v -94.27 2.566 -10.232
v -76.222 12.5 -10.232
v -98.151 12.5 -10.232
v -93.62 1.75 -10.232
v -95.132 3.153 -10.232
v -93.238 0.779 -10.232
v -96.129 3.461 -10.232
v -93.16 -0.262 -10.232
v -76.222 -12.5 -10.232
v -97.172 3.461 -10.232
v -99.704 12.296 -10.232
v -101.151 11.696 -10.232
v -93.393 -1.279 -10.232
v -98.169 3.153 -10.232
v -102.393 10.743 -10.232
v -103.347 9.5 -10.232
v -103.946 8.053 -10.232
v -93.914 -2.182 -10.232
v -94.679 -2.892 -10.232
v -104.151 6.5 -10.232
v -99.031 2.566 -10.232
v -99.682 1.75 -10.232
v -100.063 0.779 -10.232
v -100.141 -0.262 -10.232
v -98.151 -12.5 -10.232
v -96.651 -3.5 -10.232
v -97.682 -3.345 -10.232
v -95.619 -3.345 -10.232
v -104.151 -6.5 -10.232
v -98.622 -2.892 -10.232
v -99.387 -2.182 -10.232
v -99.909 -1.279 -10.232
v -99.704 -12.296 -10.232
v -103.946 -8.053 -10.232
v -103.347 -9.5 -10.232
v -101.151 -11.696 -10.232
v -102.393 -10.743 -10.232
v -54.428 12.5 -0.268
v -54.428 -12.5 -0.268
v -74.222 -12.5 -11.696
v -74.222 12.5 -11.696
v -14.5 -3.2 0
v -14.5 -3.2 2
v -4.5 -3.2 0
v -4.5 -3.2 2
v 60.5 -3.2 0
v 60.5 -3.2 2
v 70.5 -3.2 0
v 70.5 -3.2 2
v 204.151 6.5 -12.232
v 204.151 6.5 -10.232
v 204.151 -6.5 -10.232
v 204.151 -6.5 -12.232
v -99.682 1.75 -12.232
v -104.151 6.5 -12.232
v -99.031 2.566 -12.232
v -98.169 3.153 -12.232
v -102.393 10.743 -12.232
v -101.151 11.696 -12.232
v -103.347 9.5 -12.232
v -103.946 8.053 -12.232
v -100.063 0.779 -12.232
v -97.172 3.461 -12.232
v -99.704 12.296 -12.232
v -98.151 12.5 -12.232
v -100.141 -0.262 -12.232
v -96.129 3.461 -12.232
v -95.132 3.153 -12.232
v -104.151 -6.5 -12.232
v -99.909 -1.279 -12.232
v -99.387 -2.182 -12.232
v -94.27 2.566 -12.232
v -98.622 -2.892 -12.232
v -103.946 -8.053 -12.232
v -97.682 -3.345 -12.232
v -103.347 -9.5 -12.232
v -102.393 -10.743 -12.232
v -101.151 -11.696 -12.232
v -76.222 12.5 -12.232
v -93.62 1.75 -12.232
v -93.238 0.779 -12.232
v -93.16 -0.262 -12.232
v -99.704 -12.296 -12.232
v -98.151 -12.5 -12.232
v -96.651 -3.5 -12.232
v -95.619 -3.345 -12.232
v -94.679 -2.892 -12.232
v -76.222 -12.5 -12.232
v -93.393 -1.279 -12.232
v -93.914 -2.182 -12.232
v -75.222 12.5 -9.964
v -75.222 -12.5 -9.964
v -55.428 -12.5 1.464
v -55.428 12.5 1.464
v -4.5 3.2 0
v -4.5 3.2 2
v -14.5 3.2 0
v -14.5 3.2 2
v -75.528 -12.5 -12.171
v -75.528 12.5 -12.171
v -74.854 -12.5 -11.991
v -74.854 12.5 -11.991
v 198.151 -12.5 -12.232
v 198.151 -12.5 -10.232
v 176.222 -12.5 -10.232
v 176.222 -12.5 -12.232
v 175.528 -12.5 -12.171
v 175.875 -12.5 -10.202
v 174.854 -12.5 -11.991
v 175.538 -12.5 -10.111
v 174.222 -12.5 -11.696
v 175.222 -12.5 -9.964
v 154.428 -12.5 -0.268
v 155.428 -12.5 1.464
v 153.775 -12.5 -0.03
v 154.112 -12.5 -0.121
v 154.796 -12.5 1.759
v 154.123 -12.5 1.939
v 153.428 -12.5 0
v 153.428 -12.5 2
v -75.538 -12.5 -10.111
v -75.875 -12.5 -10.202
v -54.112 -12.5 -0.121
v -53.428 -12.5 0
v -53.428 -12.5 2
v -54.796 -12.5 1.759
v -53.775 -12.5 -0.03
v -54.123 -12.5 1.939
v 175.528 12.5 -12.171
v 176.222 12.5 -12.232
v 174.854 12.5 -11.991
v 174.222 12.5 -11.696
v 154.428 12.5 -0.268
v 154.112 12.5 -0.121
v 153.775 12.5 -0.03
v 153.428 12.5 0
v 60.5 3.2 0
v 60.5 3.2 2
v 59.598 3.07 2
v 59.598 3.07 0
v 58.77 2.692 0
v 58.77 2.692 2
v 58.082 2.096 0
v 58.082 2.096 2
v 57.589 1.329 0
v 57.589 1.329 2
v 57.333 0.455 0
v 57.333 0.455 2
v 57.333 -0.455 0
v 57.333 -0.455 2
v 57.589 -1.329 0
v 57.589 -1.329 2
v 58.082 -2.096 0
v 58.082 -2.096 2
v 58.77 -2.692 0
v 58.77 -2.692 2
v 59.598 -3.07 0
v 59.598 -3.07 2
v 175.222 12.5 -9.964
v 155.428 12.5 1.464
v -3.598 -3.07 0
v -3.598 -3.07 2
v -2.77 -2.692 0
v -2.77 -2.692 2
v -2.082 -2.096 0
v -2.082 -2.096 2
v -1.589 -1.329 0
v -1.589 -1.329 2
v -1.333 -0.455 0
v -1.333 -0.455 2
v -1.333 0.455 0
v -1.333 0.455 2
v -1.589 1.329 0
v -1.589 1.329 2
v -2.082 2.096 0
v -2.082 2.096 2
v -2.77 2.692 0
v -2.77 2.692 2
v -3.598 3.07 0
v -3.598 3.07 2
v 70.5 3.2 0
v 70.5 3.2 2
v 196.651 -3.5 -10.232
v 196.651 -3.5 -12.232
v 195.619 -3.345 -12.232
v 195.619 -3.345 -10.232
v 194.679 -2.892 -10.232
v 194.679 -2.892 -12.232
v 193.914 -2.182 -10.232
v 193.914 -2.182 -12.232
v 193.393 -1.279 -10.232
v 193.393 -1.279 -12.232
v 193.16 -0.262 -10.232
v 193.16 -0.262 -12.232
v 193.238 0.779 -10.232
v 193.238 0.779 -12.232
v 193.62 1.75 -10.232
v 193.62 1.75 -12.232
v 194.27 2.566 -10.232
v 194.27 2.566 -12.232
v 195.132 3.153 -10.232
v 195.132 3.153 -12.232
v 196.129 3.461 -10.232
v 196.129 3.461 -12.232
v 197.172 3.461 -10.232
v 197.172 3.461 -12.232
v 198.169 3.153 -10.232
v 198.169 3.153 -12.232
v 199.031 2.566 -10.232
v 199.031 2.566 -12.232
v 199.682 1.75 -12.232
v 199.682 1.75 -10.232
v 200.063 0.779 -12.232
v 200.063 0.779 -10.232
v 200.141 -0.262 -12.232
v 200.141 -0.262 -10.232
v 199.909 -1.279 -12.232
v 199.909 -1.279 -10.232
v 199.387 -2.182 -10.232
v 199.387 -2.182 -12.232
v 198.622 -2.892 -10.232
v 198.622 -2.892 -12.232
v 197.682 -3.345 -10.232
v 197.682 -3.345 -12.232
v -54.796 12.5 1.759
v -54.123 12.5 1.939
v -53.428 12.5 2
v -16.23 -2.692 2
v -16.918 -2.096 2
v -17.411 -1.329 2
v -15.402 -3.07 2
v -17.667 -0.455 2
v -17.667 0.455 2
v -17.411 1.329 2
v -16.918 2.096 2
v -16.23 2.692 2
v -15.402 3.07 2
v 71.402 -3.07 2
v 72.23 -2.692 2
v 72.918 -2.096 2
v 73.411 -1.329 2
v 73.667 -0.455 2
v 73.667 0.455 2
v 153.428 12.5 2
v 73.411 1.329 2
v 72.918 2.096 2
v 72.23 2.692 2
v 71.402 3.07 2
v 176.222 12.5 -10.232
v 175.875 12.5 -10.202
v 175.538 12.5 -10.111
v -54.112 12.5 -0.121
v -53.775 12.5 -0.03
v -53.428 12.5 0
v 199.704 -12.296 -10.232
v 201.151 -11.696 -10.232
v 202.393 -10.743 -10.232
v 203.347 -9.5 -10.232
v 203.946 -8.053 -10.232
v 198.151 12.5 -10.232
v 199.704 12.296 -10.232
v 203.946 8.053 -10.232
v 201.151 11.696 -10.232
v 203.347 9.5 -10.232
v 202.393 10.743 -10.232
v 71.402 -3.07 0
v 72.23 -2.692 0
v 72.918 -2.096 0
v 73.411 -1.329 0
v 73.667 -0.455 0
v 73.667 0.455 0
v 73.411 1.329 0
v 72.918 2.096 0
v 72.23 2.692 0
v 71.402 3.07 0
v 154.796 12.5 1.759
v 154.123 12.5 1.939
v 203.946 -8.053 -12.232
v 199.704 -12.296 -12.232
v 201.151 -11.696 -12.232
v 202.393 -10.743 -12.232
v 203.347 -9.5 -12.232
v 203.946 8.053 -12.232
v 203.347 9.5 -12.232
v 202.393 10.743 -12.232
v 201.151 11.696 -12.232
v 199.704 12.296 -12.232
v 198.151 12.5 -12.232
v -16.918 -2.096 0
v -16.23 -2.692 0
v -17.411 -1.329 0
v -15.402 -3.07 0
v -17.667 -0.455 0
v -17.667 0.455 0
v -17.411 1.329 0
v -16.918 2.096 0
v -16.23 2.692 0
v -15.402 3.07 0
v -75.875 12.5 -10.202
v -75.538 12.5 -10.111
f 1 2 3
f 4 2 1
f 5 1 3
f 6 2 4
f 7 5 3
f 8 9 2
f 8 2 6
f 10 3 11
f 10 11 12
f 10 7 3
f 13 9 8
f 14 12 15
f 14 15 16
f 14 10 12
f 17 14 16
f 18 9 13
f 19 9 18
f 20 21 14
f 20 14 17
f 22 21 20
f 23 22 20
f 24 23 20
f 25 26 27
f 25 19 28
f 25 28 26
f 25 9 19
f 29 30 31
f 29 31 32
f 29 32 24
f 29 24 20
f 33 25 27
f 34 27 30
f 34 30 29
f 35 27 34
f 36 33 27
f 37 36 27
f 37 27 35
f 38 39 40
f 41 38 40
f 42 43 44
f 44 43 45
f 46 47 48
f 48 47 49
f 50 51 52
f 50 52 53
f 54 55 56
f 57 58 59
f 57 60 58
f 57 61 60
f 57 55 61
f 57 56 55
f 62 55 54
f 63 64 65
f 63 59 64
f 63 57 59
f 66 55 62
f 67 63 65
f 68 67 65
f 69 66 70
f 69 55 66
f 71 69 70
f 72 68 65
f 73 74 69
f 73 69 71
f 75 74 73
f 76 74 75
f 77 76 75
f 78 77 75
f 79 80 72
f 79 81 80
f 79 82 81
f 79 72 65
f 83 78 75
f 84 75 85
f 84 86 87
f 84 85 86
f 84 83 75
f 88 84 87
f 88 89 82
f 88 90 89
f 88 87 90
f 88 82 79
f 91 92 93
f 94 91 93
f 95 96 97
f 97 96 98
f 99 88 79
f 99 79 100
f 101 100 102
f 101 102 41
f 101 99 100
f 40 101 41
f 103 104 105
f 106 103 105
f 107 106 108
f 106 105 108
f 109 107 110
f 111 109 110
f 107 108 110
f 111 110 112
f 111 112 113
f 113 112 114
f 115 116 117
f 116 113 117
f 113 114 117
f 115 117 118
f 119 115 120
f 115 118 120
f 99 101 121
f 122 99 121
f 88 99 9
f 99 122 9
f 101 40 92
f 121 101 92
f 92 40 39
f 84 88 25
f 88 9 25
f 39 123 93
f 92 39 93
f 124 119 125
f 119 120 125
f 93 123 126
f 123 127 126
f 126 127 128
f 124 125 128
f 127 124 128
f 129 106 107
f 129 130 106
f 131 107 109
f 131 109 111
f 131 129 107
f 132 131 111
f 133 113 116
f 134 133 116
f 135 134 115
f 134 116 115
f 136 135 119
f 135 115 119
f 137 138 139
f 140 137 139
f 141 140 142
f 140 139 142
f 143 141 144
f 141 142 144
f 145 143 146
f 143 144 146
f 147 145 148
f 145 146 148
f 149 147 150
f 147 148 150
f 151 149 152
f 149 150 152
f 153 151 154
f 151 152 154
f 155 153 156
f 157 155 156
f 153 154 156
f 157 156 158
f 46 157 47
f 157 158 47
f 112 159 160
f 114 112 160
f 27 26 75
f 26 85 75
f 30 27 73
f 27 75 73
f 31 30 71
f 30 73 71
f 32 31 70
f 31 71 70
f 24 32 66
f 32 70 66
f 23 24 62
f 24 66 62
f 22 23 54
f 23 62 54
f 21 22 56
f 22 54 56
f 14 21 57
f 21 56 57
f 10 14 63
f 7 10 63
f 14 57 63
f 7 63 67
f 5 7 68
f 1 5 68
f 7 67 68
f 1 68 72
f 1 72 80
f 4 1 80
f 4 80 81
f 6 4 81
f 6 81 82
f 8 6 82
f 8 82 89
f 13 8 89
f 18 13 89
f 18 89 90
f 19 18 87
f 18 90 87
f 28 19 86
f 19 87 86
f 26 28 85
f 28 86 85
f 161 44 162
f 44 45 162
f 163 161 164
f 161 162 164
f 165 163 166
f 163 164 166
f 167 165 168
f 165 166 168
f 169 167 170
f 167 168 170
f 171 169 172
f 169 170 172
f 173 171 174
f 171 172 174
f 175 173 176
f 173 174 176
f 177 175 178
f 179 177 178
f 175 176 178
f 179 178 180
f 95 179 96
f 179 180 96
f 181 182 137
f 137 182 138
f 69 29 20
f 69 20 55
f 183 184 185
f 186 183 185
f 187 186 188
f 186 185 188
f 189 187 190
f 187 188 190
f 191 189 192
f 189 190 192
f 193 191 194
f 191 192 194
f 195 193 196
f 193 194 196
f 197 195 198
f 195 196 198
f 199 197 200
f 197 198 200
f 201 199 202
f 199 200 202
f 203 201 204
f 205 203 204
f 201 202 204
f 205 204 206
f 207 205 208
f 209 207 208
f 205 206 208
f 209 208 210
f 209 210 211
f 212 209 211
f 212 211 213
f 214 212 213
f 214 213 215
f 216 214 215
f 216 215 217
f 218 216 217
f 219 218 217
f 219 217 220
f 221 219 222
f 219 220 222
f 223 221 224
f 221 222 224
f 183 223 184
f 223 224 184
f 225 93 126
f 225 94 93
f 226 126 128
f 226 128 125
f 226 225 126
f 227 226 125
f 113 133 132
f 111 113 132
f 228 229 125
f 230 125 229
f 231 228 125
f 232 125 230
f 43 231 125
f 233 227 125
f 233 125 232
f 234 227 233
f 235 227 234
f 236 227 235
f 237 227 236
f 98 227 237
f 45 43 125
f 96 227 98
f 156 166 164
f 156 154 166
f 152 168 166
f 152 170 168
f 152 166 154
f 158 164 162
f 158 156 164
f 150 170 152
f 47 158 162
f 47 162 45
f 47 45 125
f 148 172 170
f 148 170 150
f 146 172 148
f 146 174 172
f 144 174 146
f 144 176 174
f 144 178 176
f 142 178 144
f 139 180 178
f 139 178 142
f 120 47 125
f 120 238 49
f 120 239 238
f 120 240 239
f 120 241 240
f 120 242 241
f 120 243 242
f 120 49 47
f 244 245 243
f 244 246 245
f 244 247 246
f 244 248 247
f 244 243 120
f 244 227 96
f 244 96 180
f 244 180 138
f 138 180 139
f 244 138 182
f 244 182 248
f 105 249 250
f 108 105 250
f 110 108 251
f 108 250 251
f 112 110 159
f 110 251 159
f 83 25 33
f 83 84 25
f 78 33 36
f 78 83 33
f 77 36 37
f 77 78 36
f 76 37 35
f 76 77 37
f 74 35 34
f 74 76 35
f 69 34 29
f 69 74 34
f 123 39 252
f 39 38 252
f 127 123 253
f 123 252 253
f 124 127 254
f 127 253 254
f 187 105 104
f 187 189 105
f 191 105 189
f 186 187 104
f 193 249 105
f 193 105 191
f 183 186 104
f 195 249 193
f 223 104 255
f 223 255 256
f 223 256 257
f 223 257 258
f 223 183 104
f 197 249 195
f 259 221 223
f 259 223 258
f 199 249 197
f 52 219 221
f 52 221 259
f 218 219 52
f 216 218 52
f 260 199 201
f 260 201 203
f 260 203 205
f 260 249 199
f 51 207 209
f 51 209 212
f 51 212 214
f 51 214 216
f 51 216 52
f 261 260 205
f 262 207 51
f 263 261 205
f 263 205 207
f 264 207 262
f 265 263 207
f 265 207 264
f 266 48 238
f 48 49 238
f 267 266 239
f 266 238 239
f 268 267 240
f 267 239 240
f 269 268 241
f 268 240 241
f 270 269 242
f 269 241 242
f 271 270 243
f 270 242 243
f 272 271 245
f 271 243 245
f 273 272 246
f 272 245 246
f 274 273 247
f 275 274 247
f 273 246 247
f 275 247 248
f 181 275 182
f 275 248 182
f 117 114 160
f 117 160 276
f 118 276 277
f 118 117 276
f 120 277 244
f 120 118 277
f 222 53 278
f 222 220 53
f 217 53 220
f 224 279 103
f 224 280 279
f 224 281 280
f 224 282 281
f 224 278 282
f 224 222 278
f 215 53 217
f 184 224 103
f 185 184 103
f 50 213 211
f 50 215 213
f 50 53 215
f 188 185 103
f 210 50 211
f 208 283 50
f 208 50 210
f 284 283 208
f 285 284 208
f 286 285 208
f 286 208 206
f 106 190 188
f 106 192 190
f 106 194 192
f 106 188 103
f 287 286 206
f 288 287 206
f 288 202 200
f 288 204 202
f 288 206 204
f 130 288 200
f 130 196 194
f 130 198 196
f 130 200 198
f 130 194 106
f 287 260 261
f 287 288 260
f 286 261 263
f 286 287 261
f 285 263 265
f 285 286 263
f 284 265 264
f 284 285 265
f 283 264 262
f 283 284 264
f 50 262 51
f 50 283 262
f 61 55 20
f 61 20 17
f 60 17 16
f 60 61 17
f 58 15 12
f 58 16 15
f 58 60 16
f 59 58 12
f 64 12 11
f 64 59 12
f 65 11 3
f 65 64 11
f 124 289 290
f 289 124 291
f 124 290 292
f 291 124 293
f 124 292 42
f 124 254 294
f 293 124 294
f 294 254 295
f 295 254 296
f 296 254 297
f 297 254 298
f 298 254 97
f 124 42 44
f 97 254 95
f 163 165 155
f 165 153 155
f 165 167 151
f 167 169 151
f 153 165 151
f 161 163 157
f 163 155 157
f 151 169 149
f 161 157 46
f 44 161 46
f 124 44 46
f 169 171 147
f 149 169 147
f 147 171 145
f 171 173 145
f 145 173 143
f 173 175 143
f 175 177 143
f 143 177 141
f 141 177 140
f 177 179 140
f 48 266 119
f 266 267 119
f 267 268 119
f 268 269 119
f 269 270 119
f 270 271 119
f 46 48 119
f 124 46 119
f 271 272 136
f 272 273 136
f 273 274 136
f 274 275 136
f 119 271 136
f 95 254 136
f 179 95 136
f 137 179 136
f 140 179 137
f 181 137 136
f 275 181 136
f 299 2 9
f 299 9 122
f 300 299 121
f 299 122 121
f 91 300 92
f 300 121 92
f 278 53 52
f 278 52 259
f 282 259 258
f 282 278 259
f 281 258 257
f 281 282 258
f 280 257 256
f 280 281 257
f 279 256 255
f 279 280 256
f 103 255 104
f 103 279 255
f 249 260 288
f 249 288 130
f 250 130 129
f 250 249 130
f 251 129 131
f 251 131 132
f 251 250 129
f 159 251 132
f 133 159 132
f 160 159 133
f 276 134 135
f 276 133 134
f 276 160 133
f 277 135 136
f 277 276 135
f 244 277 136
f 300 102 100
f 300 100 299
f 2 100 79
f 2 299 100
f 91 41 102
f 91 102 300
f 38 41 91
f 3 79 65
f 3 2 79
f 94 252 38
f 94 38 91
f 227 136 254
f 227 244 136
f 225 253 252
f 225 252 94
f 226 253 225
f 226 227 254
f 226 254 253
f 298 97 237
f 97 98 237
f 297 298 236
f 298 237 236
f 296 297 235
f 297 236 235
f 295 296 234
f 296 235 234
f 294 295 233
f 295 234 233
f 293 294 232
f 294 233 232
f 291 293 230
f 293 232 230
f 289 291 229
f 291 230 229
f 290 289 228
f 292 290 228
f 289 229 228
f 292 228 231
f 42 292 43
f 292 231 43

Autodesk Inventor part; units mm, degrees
ref_plane "YZ Plane" through (0, 0, 0) normal (1, 0, 0) x (0, 1, 0)
ref_plane "XZ Plane" through (0, 0, 0) normal (0, 1, 0) x (-1, 0, 0)
ref_plane "XY Plane" through (0, 0, 0) normal (0, 0, 1) x (1, 0, 0)
sketch "Sketch1" plane through (0, 0, 0) normal (0, 0, 1) x (1, 0, 0)
  line L0 (-54.5, -12.5) -> (154.5, -12.5)
  line L1 (154.5, -12.5) -> (154.5, 12.5)
  line L2 (154.5, 12.5) -> (-54.5, 12.5)
  line L3 (-54.5, 12.5) -> (-54.5, -12.5)
  line L4 (-54.5, -12.5) -> (154.5, 12.5) construction
  line L5 (154.5, -12.5) -> (-54.5, 12.5) construction
  line L6 (149.5, 192.0914) -> (-150.5, 192.0914)
  line L7 (205, 191) -> (-105, 191)
  point P0 (50, 0)
  point P1 (50, 0)
  point P2 (50, 0)
  point P3 (50, 191)
  dimension "d0" = 25
  dimension "d1" = 209
extrude "Plate1" add sketch "Sketch1" along normal blind 2
sketch "Sketch2" plane through (153.5, -12.5, 0.2679) normal (0.5, 0, 0.8660254) x (0, 1, 0)
  line L0 (25, 0) -> (0, 0)
  line L1 (0, 0) -> (0, -25)
  line L2 (0, -25) -> (25, -25)
  line L3 (25, -25) -> (25, 0)
edge flange "Flange1" height 25 angle 30 thickness 2 bend radius 2 thickness toward (0.5, 0, 0.8660254) relief tear relief width 2 relief depth 1 corner gap 2 corner form 0 edges at (154.5, 0, 0) (-54.5, 0, 0) wall of the first edge with corners at (153.5, 12.5, 0.2679) (153.5, -12.5, 0.2679) (175.1506, -12.5, -12.2321) (175.1506, 12.5, -12.2321)
bend "Bend1"
corner "Corner1"
sketch "Sketch3" plane through (175.1506, 12.5, -10.2321) normal (0, 0, -1) x (-1, 0, 0)
  line L0 (0, -25) -> (0, 0)
  line L1 (0, 0) -> (-29, 0)
  line L2 (-29, 0) -> (-29, -25)
  line L3 (-29, -25) -> (0, -25)
edge flange "Flange2" height 29 angle 30 thickness 2 bend radius 2 thickness toward (0, 0, -1) relief tear relief width 2 relief depth 1 corner gap 2 corner form 0 edges at (176.1506, 0, -10.5) (-76.1506, 0, -10.5) wall of the first edge with corners at (175.1506, -12.5, -10.2321) (175.1506, 12.5, -10.2321) (204.1506, 12.5, -10.2321) (204.1506, -12.5, -10.2321)
bend "Bend2"
corner "Corner2"
sketch "Sketch4" plane through (0, 0, 2) normal (0, 0, 1) x (1, 0, 0)
  line L0 (-14.5, 0) -> (-4.5, 0) construction
  line L1 (-14.5, -3.2) -> (-4.5, -3.2)
  line L2 (-4.5, 3.2) -> (-14.5, 3.2)
  arc A0 (-14.5, 3.2) -> (-14.5, -3.2) centre (-14.5, 0) ccw
  arc A1 (-4.5, -3.2) -> (-4.5, 3.2) centre (-4.5, 0) ccw
  line L3 (60.5, 0) -> (70.5, 0) construction
  line L4 (60.5, -3.2) -> (70.5, -3.2)
  line L5 (70.5, 3.2) -> (60.5, 3.2)
  arc A2 (60.5, 3.2) -> (60.5, -3.2) centre (60.5, 0) ccw
  arc A3 (70.5, -3.2) -> (70.5, 3.2) centre (70.5, 0) ccw
  circle A4 centre (-9.5, 0) radius 3 projected
  circle A5 centre (65.5, 0) radius 2.3866 projected
  point P0 (0, 0)
  point P1 (-9.5, 0)
  point P2 (65.5, 0)
  dimension "d23" = 3.2
  dimension "d24" = 3.2
  dimension "d25" = 10
  dimension "d26" = 10
extrude "Cut1" cut sketch "Sketch4" against normal blind 2 contours A0 L2 A1 L1 | A2 L5 A3 L4 | A4 | A5
sketch "Sketch5" plane through (-104.1506, -12.5, -10.2321) normal (0, 0, 1) x (1, 0, 0)
  line L0 (0, 25) -> (0, 0) projected
  line L1 (308.3013, 0) -> (308.3013, 25) projected
  circle A0 centre (300.8013, 12.5) radius 2.75 projected
  circle A1 centre (7.5, 12.5) radius 2.75 projected
  point P0 (104.1506, 12.5)
  point P1 (300.8013, 12.5)
  point P2 (0, 12.5)
  point P3 (308.3013, 12.5)
hole "Hole1" at (-96.6506, 0, -10.2321) at (196.6506, 0, -10.2321) direction (0, 0, -1) diameter 7 depth 2 tip angle 118
fillet "Corner Round1" radius 6 4 edges at (-104.1506, 12.5, -11.2321) (-104.1506, -12.5, -11.2321) (204.1506, 12.5, -11.2321) (204.1506, -12.5, -11.2321)
equation "\"d27\" = Thickness"
equation "\"d36\" = Thickness"
equation "\"d3\" = BendReliefWidth"
equation "\"d4\" = BendReliefDepth"
equation "\"d5\" = MinimumRemnant"
equation "\"d6\" = BendRadius"
equation "\"d9\" = BendRadius"
equation "\"d10\" = CornerReliefSize"
equation "\"d11\" = GapSize"
equation "\"d12\" = JacobiRadiusSize"
equation "\"d13\" = BendReliefWidth"
equation "\"d14\" = BendReliefDepth"
equation "\"d15\" = MinimumRemnant"
equation "\"d16\" = BendRadius"
equation "\"d19\" = BendRadius"
equation "\"d20\" = CornerReliefSize"
equation "\"d21\" = GapSize"
equation "\"d22\" = JacobiRadiusSize"
equation "\"BendRadius\" = Thickness"
equation "\"BendReliefWidth\" = Thickness"
equation "\"BendReliefDepth\" = 0.5 * Thickness"
equation "\"CornerReliefSize\" = 4 * Thickness"
equation "\"MinimumRemnant\" = 2 * Thickness"
equation "\"TransitionRadius\" = BendRadius"
equation "\"JacobiRadiusSize\" = BendRadius"
equation "\"GapSize\" = Thickness"
equation "\"d2\" = BendRadius"
equation "\"Thickness\" = 2"
